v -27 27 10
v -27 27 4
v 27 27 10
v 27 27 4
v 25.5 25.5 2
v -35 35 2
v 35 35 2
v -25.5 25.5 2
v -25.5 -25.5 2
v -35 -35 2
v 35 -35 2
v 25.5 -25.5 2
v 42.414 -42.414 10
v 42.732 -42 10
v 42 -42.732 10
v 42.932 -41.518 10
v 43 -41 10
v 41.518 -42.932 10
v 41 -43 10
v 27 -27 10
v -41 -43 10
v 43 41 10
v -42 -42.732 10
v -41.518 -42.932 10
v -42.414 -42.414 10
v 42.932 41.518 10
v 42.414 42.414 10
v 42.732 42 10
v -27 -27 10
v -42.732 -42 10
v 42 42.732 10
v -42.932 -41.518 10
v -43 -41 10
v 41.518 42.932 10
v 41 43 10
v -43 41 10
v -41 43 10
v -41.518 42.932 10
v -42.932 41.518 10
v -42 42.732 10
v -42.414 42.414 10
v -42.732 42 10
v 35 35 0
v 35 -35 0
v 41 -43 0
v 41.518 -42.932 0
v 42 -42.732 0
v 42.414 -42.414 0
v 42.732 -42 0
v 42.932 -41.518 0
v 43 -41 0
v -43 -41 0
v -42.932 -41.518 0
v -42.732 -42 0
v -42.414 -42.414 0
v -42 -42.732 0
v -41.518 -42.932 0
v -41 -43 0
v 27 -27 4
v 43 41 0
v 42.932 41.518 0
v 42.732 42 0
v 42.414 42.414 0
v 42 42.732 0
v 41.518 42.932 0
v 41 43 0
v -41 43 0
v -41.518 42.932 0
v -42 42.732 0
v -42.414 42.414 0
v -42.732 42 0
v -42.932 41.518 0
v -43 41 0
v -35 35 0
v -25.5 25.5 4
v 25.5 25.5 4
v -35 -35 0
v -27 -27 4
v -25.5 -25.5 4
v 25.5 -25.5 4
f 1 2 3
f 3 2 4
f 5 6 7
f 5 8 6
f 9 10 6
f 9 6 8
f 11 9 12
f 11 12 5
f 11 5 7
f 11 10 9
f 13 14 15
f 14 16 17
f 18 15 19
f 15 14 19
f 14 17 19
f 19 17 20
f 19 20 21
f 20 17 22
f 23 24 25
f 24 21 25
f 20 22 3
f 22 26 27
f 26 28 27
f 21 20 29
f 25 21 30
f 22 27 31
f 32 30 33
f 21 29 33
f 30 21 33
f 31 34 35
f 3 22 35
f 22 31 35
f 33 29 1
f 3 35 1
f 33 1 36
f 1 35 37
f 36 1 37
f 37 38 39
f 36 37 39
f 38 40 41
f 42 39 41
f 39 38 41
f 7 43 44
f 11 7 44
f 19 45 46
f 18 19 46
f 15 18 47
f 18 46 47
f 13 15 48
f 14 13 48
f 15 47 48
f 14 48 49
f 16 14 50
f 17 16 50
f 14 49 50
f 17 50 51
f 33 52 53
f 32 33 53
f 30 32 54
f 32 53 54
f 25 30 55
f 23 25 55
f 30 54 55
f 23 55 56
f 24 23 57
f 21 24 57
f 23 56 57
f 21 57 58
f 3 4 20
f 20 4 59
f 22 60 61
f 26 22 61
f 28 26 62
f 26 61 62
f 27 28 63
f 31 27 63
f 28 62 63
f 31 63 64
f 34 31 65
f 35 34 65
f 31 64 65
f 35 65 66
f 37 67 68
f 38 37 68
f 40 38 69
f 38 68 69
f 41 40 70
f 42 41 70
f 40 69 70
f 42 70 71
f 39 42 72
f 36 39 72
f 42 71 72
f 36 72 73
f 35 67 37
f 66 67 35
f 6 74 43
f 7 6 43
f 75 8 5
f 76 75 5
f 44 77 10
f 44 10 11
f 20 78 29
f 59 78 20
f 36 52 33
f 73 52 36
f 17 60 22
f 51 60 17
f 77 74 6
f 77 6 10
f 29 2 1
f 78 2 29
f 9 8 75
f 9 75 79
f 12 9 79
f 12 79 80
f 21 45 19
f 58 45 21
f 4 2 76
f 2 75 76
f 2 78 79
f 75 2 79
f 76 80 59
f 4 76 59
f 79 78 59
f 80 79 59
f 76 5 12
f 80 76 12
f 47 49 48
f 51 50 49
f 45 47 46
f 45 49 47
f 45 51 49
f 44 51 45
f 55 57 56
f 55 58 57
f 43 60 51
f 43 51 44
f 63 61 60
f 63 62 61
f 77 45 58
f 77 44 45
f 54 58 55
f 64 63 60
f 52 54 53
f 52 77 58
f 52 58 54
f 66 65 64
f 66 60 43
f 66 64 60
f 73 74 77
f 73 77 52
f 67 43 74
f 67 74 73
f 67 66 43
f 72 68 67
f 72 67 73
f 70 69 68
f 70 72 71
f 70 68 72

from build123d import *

# Parameters (mm, degrees)
PAD_DEPTH       = 10
SKETCH001_W     = 70
SKETCH001_H     = 70
POCKET_DEPTH    = 2
SKETCH002_W     = 51
SKETCH002_H     = 51
POCKET001_DEPTH = 2
SKETCH003_W     = 54
SKETCH003_H     = 54
POCKET002_DEPTH = 6.001


with BuildPart() as part:
    # Sketch → Pad (new body)
    with BuildSketch(Plane.XY):
        with BuildLine():
            Line((-41, 43), (41, 43))
            ThreePointArc((43, 41), (42.414214, 42.414214), (41, 43))
            Line((43, 41), (43, -41))
            ThreePointArc((41, -43), (42.414214, -42.414214), (43, -41))
            Line((41, -43), (-41, -43))
            ThreePointArc((-43, -41), (-42.414214, -42.414214), (-41, -43))
            Line((-43, -41), (-43, 41))
            ThreePointArc((-41, 43), (-42.414214, 42.414214), (-43, 41))
        make_face()
    extrude(amount=PAD_DEPTH)

    # Sketch001 (on Face9 of Pad) → Pocket (cut)
    with BuildSketch(Plane(origin=(0, 0, 0), x_dir=(1, 0, 0), z_dir=(0, 0, -1))):
        Rectangle(SKETCH001_W, SKETCH001_H)
    extrude(amount=-POCKET_DEPTH, mode=Mode.SUBTRACT)

    # Sketch002 (on Face15 of Pocket) → Pocket001 (cut)
    with BuildSketch(Plane(origin=(0, 0, 2), x_dir=(1, 0, 0), z_dir=(0, 0, -1))):
        Rectangle(SKETCH002_W, SKETCH002_H)
    extrude(amount=-POCKET001_DEPTH, mode=Mode.SUBTRACT)

    # Sketch003 (on Face20 of Pocket001) → Pocket002 (cut, through all)
    with BuildSketch(Plane(origin=(0, 0, 4), x_dir=(1, 0, 0), z_dir=(0, 0, -1))):
        Rectangle(SKETCH003_W, SKETCH003_H)
    extrude(amount=-POCKET002_DEPTH, mode=Mode.SUBTRACT)


solid = part.part
